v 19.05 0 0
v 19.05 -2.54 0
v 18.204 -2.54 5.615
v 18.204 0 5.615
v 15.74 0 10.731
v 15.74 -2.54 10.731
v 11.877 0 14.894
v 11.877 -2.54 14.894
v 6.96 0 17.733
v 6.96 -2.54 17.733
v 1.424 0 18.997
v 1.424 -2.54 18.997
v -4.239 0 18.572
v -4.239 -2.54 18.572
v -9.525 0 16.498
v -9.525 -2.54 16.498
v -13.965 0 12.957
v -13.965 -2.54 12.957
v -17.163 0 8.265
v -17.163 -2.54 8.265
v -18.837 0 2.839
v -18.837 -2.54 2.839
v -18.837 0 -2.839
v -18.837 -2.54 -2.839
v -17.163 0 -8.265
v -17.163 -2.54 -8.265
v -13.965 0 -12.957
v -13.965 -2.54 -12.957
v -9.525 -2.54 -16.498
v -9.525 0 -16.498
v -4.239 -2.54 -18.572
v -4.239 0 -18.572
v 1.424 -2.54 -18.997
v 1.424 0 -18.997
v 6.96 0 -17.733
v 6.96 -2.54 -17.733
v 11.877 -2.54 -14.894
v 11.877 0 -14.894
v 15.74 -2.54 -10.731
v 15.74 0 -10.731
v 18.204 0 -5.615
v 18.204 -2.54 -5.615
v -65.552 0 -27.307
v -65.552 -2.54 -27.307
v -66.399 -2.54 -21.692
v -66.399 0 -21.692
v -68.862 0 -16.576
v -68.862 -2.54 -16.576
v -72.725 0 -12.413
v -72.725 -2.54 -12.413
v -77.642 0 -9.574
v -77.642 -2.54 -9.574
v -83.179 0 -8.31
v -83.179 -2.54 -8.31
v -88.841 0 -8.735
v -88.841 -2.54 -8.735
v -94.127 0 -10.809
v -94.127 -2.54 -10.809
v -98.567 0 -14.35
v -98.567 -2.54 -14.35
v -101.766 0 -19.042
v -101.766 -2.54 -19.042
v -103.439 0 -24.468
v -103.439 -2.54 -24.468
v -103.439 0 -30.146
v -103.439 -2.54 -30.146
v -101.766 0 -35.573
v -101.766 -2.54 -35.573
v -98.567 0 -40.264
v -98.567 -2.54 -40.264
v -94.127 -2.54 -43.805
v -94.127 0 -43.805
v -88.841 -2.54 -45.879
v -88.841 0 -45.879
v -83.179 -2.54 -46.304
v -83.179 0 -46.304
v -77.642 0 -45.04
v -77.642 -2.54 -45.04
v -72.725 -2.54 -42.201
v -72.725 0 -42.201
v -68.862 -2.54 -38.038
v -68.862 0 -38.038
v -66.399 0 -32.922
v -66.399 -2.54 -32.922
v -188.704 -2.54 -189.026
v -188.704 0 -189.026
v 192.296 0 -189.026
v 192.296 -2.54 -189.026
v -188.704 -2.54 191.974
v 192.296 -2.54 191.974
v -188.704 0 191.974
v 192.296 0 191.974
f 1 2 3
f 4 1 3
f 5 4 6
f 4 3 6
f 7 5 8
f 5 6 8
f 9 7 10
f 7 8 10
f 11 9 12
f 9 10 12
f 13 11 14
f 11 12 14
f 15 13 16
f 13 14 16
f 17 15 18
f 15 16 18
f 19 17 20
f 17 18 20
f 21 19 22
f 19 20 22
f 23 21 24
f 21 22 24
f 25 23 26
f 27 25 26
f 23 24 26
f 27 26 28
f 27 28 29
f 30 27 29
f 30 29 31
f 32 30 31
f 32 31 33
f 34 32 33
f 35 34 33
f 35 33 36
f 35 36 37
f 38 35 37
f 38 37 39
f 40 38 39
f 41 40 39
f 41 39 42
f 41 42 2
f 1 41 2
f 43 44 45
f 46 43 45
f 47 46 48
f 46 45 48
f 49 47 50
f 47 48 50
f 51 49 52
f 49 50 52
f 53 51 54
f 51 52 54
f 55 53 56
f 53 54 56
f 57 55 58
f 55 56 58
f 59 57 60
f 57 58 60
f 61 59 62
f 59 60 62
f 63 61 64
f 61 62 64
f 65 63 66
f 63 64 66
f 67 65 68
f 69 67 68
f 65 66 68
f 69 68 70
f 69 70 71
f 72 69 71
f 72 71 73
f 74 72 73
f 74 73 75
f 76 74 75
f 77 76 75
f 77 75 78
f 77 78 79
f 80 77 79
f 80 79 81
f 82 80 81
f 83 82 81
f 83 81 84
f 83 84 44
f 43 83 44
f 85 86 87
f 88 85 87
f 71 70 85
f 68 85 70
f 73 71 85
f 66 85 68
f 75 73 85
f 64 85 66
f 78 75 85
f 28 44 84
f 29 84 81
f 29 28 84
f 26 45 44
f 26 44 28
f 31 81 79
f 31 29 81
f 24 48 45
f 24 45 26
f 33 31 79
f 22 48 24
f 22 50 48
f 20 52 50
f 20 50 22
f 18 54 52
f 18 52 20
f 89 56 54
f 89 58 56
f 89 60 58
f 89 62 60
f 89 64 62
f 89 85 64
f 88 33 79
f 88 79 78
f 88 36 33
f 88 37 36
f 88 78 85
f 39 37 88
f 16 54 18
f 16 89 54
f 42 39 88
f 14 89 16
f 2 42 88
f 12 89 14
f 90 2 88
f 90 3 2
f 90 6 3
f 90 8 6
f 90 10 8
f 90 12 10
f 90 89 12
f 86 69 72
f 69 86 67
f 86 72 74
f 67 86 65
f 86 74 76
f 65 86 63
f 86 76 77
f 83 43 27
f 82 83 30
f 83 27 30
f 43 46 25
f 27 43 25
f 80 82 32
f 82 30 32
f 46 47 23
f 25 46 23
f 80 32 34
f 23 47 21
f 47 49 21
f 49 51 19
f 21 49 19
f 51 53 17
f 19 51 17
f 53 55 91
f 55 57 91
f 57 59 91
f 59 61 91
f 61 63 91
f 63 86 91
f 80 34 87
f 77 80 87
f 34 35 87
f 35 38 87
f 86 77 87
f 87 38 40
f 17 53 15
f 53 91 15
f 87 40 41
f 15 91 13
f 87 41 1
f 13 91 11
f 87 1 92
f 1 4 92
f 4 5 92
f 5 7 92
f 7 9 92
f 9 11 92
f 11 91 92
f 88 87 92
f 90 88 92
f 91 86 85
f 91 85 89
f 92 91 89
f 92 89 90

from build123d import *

# Parameters (mm, degrees)
F0_W     = 381
F0_H     = 381
F1_DEPTH = 2.54
F2_R     = 19.05
F3_DEPTH = 2.541


with BuildPart() as f1:
    # F0 (on Front) → F1 (new body)
    with BuildSketch(Plane.XZ):
        with Locations((1.796125, 1.474147)):
            Rectangle(F0_W, F0_H)
    extrude(amount=F1_DEPTH)

    # F2 (on face) → F3 (cut, through all)
    with BuildSketch(Plane.XZ.offset(2.54)):
        Circle(F2_R)
        with Locations((-84.602214, -27.307058)):
            Circle(F2_R)
    extrude(amount=-F3_DEPTH, mode=Mode.SUBTRACT)


solid = f1.part
